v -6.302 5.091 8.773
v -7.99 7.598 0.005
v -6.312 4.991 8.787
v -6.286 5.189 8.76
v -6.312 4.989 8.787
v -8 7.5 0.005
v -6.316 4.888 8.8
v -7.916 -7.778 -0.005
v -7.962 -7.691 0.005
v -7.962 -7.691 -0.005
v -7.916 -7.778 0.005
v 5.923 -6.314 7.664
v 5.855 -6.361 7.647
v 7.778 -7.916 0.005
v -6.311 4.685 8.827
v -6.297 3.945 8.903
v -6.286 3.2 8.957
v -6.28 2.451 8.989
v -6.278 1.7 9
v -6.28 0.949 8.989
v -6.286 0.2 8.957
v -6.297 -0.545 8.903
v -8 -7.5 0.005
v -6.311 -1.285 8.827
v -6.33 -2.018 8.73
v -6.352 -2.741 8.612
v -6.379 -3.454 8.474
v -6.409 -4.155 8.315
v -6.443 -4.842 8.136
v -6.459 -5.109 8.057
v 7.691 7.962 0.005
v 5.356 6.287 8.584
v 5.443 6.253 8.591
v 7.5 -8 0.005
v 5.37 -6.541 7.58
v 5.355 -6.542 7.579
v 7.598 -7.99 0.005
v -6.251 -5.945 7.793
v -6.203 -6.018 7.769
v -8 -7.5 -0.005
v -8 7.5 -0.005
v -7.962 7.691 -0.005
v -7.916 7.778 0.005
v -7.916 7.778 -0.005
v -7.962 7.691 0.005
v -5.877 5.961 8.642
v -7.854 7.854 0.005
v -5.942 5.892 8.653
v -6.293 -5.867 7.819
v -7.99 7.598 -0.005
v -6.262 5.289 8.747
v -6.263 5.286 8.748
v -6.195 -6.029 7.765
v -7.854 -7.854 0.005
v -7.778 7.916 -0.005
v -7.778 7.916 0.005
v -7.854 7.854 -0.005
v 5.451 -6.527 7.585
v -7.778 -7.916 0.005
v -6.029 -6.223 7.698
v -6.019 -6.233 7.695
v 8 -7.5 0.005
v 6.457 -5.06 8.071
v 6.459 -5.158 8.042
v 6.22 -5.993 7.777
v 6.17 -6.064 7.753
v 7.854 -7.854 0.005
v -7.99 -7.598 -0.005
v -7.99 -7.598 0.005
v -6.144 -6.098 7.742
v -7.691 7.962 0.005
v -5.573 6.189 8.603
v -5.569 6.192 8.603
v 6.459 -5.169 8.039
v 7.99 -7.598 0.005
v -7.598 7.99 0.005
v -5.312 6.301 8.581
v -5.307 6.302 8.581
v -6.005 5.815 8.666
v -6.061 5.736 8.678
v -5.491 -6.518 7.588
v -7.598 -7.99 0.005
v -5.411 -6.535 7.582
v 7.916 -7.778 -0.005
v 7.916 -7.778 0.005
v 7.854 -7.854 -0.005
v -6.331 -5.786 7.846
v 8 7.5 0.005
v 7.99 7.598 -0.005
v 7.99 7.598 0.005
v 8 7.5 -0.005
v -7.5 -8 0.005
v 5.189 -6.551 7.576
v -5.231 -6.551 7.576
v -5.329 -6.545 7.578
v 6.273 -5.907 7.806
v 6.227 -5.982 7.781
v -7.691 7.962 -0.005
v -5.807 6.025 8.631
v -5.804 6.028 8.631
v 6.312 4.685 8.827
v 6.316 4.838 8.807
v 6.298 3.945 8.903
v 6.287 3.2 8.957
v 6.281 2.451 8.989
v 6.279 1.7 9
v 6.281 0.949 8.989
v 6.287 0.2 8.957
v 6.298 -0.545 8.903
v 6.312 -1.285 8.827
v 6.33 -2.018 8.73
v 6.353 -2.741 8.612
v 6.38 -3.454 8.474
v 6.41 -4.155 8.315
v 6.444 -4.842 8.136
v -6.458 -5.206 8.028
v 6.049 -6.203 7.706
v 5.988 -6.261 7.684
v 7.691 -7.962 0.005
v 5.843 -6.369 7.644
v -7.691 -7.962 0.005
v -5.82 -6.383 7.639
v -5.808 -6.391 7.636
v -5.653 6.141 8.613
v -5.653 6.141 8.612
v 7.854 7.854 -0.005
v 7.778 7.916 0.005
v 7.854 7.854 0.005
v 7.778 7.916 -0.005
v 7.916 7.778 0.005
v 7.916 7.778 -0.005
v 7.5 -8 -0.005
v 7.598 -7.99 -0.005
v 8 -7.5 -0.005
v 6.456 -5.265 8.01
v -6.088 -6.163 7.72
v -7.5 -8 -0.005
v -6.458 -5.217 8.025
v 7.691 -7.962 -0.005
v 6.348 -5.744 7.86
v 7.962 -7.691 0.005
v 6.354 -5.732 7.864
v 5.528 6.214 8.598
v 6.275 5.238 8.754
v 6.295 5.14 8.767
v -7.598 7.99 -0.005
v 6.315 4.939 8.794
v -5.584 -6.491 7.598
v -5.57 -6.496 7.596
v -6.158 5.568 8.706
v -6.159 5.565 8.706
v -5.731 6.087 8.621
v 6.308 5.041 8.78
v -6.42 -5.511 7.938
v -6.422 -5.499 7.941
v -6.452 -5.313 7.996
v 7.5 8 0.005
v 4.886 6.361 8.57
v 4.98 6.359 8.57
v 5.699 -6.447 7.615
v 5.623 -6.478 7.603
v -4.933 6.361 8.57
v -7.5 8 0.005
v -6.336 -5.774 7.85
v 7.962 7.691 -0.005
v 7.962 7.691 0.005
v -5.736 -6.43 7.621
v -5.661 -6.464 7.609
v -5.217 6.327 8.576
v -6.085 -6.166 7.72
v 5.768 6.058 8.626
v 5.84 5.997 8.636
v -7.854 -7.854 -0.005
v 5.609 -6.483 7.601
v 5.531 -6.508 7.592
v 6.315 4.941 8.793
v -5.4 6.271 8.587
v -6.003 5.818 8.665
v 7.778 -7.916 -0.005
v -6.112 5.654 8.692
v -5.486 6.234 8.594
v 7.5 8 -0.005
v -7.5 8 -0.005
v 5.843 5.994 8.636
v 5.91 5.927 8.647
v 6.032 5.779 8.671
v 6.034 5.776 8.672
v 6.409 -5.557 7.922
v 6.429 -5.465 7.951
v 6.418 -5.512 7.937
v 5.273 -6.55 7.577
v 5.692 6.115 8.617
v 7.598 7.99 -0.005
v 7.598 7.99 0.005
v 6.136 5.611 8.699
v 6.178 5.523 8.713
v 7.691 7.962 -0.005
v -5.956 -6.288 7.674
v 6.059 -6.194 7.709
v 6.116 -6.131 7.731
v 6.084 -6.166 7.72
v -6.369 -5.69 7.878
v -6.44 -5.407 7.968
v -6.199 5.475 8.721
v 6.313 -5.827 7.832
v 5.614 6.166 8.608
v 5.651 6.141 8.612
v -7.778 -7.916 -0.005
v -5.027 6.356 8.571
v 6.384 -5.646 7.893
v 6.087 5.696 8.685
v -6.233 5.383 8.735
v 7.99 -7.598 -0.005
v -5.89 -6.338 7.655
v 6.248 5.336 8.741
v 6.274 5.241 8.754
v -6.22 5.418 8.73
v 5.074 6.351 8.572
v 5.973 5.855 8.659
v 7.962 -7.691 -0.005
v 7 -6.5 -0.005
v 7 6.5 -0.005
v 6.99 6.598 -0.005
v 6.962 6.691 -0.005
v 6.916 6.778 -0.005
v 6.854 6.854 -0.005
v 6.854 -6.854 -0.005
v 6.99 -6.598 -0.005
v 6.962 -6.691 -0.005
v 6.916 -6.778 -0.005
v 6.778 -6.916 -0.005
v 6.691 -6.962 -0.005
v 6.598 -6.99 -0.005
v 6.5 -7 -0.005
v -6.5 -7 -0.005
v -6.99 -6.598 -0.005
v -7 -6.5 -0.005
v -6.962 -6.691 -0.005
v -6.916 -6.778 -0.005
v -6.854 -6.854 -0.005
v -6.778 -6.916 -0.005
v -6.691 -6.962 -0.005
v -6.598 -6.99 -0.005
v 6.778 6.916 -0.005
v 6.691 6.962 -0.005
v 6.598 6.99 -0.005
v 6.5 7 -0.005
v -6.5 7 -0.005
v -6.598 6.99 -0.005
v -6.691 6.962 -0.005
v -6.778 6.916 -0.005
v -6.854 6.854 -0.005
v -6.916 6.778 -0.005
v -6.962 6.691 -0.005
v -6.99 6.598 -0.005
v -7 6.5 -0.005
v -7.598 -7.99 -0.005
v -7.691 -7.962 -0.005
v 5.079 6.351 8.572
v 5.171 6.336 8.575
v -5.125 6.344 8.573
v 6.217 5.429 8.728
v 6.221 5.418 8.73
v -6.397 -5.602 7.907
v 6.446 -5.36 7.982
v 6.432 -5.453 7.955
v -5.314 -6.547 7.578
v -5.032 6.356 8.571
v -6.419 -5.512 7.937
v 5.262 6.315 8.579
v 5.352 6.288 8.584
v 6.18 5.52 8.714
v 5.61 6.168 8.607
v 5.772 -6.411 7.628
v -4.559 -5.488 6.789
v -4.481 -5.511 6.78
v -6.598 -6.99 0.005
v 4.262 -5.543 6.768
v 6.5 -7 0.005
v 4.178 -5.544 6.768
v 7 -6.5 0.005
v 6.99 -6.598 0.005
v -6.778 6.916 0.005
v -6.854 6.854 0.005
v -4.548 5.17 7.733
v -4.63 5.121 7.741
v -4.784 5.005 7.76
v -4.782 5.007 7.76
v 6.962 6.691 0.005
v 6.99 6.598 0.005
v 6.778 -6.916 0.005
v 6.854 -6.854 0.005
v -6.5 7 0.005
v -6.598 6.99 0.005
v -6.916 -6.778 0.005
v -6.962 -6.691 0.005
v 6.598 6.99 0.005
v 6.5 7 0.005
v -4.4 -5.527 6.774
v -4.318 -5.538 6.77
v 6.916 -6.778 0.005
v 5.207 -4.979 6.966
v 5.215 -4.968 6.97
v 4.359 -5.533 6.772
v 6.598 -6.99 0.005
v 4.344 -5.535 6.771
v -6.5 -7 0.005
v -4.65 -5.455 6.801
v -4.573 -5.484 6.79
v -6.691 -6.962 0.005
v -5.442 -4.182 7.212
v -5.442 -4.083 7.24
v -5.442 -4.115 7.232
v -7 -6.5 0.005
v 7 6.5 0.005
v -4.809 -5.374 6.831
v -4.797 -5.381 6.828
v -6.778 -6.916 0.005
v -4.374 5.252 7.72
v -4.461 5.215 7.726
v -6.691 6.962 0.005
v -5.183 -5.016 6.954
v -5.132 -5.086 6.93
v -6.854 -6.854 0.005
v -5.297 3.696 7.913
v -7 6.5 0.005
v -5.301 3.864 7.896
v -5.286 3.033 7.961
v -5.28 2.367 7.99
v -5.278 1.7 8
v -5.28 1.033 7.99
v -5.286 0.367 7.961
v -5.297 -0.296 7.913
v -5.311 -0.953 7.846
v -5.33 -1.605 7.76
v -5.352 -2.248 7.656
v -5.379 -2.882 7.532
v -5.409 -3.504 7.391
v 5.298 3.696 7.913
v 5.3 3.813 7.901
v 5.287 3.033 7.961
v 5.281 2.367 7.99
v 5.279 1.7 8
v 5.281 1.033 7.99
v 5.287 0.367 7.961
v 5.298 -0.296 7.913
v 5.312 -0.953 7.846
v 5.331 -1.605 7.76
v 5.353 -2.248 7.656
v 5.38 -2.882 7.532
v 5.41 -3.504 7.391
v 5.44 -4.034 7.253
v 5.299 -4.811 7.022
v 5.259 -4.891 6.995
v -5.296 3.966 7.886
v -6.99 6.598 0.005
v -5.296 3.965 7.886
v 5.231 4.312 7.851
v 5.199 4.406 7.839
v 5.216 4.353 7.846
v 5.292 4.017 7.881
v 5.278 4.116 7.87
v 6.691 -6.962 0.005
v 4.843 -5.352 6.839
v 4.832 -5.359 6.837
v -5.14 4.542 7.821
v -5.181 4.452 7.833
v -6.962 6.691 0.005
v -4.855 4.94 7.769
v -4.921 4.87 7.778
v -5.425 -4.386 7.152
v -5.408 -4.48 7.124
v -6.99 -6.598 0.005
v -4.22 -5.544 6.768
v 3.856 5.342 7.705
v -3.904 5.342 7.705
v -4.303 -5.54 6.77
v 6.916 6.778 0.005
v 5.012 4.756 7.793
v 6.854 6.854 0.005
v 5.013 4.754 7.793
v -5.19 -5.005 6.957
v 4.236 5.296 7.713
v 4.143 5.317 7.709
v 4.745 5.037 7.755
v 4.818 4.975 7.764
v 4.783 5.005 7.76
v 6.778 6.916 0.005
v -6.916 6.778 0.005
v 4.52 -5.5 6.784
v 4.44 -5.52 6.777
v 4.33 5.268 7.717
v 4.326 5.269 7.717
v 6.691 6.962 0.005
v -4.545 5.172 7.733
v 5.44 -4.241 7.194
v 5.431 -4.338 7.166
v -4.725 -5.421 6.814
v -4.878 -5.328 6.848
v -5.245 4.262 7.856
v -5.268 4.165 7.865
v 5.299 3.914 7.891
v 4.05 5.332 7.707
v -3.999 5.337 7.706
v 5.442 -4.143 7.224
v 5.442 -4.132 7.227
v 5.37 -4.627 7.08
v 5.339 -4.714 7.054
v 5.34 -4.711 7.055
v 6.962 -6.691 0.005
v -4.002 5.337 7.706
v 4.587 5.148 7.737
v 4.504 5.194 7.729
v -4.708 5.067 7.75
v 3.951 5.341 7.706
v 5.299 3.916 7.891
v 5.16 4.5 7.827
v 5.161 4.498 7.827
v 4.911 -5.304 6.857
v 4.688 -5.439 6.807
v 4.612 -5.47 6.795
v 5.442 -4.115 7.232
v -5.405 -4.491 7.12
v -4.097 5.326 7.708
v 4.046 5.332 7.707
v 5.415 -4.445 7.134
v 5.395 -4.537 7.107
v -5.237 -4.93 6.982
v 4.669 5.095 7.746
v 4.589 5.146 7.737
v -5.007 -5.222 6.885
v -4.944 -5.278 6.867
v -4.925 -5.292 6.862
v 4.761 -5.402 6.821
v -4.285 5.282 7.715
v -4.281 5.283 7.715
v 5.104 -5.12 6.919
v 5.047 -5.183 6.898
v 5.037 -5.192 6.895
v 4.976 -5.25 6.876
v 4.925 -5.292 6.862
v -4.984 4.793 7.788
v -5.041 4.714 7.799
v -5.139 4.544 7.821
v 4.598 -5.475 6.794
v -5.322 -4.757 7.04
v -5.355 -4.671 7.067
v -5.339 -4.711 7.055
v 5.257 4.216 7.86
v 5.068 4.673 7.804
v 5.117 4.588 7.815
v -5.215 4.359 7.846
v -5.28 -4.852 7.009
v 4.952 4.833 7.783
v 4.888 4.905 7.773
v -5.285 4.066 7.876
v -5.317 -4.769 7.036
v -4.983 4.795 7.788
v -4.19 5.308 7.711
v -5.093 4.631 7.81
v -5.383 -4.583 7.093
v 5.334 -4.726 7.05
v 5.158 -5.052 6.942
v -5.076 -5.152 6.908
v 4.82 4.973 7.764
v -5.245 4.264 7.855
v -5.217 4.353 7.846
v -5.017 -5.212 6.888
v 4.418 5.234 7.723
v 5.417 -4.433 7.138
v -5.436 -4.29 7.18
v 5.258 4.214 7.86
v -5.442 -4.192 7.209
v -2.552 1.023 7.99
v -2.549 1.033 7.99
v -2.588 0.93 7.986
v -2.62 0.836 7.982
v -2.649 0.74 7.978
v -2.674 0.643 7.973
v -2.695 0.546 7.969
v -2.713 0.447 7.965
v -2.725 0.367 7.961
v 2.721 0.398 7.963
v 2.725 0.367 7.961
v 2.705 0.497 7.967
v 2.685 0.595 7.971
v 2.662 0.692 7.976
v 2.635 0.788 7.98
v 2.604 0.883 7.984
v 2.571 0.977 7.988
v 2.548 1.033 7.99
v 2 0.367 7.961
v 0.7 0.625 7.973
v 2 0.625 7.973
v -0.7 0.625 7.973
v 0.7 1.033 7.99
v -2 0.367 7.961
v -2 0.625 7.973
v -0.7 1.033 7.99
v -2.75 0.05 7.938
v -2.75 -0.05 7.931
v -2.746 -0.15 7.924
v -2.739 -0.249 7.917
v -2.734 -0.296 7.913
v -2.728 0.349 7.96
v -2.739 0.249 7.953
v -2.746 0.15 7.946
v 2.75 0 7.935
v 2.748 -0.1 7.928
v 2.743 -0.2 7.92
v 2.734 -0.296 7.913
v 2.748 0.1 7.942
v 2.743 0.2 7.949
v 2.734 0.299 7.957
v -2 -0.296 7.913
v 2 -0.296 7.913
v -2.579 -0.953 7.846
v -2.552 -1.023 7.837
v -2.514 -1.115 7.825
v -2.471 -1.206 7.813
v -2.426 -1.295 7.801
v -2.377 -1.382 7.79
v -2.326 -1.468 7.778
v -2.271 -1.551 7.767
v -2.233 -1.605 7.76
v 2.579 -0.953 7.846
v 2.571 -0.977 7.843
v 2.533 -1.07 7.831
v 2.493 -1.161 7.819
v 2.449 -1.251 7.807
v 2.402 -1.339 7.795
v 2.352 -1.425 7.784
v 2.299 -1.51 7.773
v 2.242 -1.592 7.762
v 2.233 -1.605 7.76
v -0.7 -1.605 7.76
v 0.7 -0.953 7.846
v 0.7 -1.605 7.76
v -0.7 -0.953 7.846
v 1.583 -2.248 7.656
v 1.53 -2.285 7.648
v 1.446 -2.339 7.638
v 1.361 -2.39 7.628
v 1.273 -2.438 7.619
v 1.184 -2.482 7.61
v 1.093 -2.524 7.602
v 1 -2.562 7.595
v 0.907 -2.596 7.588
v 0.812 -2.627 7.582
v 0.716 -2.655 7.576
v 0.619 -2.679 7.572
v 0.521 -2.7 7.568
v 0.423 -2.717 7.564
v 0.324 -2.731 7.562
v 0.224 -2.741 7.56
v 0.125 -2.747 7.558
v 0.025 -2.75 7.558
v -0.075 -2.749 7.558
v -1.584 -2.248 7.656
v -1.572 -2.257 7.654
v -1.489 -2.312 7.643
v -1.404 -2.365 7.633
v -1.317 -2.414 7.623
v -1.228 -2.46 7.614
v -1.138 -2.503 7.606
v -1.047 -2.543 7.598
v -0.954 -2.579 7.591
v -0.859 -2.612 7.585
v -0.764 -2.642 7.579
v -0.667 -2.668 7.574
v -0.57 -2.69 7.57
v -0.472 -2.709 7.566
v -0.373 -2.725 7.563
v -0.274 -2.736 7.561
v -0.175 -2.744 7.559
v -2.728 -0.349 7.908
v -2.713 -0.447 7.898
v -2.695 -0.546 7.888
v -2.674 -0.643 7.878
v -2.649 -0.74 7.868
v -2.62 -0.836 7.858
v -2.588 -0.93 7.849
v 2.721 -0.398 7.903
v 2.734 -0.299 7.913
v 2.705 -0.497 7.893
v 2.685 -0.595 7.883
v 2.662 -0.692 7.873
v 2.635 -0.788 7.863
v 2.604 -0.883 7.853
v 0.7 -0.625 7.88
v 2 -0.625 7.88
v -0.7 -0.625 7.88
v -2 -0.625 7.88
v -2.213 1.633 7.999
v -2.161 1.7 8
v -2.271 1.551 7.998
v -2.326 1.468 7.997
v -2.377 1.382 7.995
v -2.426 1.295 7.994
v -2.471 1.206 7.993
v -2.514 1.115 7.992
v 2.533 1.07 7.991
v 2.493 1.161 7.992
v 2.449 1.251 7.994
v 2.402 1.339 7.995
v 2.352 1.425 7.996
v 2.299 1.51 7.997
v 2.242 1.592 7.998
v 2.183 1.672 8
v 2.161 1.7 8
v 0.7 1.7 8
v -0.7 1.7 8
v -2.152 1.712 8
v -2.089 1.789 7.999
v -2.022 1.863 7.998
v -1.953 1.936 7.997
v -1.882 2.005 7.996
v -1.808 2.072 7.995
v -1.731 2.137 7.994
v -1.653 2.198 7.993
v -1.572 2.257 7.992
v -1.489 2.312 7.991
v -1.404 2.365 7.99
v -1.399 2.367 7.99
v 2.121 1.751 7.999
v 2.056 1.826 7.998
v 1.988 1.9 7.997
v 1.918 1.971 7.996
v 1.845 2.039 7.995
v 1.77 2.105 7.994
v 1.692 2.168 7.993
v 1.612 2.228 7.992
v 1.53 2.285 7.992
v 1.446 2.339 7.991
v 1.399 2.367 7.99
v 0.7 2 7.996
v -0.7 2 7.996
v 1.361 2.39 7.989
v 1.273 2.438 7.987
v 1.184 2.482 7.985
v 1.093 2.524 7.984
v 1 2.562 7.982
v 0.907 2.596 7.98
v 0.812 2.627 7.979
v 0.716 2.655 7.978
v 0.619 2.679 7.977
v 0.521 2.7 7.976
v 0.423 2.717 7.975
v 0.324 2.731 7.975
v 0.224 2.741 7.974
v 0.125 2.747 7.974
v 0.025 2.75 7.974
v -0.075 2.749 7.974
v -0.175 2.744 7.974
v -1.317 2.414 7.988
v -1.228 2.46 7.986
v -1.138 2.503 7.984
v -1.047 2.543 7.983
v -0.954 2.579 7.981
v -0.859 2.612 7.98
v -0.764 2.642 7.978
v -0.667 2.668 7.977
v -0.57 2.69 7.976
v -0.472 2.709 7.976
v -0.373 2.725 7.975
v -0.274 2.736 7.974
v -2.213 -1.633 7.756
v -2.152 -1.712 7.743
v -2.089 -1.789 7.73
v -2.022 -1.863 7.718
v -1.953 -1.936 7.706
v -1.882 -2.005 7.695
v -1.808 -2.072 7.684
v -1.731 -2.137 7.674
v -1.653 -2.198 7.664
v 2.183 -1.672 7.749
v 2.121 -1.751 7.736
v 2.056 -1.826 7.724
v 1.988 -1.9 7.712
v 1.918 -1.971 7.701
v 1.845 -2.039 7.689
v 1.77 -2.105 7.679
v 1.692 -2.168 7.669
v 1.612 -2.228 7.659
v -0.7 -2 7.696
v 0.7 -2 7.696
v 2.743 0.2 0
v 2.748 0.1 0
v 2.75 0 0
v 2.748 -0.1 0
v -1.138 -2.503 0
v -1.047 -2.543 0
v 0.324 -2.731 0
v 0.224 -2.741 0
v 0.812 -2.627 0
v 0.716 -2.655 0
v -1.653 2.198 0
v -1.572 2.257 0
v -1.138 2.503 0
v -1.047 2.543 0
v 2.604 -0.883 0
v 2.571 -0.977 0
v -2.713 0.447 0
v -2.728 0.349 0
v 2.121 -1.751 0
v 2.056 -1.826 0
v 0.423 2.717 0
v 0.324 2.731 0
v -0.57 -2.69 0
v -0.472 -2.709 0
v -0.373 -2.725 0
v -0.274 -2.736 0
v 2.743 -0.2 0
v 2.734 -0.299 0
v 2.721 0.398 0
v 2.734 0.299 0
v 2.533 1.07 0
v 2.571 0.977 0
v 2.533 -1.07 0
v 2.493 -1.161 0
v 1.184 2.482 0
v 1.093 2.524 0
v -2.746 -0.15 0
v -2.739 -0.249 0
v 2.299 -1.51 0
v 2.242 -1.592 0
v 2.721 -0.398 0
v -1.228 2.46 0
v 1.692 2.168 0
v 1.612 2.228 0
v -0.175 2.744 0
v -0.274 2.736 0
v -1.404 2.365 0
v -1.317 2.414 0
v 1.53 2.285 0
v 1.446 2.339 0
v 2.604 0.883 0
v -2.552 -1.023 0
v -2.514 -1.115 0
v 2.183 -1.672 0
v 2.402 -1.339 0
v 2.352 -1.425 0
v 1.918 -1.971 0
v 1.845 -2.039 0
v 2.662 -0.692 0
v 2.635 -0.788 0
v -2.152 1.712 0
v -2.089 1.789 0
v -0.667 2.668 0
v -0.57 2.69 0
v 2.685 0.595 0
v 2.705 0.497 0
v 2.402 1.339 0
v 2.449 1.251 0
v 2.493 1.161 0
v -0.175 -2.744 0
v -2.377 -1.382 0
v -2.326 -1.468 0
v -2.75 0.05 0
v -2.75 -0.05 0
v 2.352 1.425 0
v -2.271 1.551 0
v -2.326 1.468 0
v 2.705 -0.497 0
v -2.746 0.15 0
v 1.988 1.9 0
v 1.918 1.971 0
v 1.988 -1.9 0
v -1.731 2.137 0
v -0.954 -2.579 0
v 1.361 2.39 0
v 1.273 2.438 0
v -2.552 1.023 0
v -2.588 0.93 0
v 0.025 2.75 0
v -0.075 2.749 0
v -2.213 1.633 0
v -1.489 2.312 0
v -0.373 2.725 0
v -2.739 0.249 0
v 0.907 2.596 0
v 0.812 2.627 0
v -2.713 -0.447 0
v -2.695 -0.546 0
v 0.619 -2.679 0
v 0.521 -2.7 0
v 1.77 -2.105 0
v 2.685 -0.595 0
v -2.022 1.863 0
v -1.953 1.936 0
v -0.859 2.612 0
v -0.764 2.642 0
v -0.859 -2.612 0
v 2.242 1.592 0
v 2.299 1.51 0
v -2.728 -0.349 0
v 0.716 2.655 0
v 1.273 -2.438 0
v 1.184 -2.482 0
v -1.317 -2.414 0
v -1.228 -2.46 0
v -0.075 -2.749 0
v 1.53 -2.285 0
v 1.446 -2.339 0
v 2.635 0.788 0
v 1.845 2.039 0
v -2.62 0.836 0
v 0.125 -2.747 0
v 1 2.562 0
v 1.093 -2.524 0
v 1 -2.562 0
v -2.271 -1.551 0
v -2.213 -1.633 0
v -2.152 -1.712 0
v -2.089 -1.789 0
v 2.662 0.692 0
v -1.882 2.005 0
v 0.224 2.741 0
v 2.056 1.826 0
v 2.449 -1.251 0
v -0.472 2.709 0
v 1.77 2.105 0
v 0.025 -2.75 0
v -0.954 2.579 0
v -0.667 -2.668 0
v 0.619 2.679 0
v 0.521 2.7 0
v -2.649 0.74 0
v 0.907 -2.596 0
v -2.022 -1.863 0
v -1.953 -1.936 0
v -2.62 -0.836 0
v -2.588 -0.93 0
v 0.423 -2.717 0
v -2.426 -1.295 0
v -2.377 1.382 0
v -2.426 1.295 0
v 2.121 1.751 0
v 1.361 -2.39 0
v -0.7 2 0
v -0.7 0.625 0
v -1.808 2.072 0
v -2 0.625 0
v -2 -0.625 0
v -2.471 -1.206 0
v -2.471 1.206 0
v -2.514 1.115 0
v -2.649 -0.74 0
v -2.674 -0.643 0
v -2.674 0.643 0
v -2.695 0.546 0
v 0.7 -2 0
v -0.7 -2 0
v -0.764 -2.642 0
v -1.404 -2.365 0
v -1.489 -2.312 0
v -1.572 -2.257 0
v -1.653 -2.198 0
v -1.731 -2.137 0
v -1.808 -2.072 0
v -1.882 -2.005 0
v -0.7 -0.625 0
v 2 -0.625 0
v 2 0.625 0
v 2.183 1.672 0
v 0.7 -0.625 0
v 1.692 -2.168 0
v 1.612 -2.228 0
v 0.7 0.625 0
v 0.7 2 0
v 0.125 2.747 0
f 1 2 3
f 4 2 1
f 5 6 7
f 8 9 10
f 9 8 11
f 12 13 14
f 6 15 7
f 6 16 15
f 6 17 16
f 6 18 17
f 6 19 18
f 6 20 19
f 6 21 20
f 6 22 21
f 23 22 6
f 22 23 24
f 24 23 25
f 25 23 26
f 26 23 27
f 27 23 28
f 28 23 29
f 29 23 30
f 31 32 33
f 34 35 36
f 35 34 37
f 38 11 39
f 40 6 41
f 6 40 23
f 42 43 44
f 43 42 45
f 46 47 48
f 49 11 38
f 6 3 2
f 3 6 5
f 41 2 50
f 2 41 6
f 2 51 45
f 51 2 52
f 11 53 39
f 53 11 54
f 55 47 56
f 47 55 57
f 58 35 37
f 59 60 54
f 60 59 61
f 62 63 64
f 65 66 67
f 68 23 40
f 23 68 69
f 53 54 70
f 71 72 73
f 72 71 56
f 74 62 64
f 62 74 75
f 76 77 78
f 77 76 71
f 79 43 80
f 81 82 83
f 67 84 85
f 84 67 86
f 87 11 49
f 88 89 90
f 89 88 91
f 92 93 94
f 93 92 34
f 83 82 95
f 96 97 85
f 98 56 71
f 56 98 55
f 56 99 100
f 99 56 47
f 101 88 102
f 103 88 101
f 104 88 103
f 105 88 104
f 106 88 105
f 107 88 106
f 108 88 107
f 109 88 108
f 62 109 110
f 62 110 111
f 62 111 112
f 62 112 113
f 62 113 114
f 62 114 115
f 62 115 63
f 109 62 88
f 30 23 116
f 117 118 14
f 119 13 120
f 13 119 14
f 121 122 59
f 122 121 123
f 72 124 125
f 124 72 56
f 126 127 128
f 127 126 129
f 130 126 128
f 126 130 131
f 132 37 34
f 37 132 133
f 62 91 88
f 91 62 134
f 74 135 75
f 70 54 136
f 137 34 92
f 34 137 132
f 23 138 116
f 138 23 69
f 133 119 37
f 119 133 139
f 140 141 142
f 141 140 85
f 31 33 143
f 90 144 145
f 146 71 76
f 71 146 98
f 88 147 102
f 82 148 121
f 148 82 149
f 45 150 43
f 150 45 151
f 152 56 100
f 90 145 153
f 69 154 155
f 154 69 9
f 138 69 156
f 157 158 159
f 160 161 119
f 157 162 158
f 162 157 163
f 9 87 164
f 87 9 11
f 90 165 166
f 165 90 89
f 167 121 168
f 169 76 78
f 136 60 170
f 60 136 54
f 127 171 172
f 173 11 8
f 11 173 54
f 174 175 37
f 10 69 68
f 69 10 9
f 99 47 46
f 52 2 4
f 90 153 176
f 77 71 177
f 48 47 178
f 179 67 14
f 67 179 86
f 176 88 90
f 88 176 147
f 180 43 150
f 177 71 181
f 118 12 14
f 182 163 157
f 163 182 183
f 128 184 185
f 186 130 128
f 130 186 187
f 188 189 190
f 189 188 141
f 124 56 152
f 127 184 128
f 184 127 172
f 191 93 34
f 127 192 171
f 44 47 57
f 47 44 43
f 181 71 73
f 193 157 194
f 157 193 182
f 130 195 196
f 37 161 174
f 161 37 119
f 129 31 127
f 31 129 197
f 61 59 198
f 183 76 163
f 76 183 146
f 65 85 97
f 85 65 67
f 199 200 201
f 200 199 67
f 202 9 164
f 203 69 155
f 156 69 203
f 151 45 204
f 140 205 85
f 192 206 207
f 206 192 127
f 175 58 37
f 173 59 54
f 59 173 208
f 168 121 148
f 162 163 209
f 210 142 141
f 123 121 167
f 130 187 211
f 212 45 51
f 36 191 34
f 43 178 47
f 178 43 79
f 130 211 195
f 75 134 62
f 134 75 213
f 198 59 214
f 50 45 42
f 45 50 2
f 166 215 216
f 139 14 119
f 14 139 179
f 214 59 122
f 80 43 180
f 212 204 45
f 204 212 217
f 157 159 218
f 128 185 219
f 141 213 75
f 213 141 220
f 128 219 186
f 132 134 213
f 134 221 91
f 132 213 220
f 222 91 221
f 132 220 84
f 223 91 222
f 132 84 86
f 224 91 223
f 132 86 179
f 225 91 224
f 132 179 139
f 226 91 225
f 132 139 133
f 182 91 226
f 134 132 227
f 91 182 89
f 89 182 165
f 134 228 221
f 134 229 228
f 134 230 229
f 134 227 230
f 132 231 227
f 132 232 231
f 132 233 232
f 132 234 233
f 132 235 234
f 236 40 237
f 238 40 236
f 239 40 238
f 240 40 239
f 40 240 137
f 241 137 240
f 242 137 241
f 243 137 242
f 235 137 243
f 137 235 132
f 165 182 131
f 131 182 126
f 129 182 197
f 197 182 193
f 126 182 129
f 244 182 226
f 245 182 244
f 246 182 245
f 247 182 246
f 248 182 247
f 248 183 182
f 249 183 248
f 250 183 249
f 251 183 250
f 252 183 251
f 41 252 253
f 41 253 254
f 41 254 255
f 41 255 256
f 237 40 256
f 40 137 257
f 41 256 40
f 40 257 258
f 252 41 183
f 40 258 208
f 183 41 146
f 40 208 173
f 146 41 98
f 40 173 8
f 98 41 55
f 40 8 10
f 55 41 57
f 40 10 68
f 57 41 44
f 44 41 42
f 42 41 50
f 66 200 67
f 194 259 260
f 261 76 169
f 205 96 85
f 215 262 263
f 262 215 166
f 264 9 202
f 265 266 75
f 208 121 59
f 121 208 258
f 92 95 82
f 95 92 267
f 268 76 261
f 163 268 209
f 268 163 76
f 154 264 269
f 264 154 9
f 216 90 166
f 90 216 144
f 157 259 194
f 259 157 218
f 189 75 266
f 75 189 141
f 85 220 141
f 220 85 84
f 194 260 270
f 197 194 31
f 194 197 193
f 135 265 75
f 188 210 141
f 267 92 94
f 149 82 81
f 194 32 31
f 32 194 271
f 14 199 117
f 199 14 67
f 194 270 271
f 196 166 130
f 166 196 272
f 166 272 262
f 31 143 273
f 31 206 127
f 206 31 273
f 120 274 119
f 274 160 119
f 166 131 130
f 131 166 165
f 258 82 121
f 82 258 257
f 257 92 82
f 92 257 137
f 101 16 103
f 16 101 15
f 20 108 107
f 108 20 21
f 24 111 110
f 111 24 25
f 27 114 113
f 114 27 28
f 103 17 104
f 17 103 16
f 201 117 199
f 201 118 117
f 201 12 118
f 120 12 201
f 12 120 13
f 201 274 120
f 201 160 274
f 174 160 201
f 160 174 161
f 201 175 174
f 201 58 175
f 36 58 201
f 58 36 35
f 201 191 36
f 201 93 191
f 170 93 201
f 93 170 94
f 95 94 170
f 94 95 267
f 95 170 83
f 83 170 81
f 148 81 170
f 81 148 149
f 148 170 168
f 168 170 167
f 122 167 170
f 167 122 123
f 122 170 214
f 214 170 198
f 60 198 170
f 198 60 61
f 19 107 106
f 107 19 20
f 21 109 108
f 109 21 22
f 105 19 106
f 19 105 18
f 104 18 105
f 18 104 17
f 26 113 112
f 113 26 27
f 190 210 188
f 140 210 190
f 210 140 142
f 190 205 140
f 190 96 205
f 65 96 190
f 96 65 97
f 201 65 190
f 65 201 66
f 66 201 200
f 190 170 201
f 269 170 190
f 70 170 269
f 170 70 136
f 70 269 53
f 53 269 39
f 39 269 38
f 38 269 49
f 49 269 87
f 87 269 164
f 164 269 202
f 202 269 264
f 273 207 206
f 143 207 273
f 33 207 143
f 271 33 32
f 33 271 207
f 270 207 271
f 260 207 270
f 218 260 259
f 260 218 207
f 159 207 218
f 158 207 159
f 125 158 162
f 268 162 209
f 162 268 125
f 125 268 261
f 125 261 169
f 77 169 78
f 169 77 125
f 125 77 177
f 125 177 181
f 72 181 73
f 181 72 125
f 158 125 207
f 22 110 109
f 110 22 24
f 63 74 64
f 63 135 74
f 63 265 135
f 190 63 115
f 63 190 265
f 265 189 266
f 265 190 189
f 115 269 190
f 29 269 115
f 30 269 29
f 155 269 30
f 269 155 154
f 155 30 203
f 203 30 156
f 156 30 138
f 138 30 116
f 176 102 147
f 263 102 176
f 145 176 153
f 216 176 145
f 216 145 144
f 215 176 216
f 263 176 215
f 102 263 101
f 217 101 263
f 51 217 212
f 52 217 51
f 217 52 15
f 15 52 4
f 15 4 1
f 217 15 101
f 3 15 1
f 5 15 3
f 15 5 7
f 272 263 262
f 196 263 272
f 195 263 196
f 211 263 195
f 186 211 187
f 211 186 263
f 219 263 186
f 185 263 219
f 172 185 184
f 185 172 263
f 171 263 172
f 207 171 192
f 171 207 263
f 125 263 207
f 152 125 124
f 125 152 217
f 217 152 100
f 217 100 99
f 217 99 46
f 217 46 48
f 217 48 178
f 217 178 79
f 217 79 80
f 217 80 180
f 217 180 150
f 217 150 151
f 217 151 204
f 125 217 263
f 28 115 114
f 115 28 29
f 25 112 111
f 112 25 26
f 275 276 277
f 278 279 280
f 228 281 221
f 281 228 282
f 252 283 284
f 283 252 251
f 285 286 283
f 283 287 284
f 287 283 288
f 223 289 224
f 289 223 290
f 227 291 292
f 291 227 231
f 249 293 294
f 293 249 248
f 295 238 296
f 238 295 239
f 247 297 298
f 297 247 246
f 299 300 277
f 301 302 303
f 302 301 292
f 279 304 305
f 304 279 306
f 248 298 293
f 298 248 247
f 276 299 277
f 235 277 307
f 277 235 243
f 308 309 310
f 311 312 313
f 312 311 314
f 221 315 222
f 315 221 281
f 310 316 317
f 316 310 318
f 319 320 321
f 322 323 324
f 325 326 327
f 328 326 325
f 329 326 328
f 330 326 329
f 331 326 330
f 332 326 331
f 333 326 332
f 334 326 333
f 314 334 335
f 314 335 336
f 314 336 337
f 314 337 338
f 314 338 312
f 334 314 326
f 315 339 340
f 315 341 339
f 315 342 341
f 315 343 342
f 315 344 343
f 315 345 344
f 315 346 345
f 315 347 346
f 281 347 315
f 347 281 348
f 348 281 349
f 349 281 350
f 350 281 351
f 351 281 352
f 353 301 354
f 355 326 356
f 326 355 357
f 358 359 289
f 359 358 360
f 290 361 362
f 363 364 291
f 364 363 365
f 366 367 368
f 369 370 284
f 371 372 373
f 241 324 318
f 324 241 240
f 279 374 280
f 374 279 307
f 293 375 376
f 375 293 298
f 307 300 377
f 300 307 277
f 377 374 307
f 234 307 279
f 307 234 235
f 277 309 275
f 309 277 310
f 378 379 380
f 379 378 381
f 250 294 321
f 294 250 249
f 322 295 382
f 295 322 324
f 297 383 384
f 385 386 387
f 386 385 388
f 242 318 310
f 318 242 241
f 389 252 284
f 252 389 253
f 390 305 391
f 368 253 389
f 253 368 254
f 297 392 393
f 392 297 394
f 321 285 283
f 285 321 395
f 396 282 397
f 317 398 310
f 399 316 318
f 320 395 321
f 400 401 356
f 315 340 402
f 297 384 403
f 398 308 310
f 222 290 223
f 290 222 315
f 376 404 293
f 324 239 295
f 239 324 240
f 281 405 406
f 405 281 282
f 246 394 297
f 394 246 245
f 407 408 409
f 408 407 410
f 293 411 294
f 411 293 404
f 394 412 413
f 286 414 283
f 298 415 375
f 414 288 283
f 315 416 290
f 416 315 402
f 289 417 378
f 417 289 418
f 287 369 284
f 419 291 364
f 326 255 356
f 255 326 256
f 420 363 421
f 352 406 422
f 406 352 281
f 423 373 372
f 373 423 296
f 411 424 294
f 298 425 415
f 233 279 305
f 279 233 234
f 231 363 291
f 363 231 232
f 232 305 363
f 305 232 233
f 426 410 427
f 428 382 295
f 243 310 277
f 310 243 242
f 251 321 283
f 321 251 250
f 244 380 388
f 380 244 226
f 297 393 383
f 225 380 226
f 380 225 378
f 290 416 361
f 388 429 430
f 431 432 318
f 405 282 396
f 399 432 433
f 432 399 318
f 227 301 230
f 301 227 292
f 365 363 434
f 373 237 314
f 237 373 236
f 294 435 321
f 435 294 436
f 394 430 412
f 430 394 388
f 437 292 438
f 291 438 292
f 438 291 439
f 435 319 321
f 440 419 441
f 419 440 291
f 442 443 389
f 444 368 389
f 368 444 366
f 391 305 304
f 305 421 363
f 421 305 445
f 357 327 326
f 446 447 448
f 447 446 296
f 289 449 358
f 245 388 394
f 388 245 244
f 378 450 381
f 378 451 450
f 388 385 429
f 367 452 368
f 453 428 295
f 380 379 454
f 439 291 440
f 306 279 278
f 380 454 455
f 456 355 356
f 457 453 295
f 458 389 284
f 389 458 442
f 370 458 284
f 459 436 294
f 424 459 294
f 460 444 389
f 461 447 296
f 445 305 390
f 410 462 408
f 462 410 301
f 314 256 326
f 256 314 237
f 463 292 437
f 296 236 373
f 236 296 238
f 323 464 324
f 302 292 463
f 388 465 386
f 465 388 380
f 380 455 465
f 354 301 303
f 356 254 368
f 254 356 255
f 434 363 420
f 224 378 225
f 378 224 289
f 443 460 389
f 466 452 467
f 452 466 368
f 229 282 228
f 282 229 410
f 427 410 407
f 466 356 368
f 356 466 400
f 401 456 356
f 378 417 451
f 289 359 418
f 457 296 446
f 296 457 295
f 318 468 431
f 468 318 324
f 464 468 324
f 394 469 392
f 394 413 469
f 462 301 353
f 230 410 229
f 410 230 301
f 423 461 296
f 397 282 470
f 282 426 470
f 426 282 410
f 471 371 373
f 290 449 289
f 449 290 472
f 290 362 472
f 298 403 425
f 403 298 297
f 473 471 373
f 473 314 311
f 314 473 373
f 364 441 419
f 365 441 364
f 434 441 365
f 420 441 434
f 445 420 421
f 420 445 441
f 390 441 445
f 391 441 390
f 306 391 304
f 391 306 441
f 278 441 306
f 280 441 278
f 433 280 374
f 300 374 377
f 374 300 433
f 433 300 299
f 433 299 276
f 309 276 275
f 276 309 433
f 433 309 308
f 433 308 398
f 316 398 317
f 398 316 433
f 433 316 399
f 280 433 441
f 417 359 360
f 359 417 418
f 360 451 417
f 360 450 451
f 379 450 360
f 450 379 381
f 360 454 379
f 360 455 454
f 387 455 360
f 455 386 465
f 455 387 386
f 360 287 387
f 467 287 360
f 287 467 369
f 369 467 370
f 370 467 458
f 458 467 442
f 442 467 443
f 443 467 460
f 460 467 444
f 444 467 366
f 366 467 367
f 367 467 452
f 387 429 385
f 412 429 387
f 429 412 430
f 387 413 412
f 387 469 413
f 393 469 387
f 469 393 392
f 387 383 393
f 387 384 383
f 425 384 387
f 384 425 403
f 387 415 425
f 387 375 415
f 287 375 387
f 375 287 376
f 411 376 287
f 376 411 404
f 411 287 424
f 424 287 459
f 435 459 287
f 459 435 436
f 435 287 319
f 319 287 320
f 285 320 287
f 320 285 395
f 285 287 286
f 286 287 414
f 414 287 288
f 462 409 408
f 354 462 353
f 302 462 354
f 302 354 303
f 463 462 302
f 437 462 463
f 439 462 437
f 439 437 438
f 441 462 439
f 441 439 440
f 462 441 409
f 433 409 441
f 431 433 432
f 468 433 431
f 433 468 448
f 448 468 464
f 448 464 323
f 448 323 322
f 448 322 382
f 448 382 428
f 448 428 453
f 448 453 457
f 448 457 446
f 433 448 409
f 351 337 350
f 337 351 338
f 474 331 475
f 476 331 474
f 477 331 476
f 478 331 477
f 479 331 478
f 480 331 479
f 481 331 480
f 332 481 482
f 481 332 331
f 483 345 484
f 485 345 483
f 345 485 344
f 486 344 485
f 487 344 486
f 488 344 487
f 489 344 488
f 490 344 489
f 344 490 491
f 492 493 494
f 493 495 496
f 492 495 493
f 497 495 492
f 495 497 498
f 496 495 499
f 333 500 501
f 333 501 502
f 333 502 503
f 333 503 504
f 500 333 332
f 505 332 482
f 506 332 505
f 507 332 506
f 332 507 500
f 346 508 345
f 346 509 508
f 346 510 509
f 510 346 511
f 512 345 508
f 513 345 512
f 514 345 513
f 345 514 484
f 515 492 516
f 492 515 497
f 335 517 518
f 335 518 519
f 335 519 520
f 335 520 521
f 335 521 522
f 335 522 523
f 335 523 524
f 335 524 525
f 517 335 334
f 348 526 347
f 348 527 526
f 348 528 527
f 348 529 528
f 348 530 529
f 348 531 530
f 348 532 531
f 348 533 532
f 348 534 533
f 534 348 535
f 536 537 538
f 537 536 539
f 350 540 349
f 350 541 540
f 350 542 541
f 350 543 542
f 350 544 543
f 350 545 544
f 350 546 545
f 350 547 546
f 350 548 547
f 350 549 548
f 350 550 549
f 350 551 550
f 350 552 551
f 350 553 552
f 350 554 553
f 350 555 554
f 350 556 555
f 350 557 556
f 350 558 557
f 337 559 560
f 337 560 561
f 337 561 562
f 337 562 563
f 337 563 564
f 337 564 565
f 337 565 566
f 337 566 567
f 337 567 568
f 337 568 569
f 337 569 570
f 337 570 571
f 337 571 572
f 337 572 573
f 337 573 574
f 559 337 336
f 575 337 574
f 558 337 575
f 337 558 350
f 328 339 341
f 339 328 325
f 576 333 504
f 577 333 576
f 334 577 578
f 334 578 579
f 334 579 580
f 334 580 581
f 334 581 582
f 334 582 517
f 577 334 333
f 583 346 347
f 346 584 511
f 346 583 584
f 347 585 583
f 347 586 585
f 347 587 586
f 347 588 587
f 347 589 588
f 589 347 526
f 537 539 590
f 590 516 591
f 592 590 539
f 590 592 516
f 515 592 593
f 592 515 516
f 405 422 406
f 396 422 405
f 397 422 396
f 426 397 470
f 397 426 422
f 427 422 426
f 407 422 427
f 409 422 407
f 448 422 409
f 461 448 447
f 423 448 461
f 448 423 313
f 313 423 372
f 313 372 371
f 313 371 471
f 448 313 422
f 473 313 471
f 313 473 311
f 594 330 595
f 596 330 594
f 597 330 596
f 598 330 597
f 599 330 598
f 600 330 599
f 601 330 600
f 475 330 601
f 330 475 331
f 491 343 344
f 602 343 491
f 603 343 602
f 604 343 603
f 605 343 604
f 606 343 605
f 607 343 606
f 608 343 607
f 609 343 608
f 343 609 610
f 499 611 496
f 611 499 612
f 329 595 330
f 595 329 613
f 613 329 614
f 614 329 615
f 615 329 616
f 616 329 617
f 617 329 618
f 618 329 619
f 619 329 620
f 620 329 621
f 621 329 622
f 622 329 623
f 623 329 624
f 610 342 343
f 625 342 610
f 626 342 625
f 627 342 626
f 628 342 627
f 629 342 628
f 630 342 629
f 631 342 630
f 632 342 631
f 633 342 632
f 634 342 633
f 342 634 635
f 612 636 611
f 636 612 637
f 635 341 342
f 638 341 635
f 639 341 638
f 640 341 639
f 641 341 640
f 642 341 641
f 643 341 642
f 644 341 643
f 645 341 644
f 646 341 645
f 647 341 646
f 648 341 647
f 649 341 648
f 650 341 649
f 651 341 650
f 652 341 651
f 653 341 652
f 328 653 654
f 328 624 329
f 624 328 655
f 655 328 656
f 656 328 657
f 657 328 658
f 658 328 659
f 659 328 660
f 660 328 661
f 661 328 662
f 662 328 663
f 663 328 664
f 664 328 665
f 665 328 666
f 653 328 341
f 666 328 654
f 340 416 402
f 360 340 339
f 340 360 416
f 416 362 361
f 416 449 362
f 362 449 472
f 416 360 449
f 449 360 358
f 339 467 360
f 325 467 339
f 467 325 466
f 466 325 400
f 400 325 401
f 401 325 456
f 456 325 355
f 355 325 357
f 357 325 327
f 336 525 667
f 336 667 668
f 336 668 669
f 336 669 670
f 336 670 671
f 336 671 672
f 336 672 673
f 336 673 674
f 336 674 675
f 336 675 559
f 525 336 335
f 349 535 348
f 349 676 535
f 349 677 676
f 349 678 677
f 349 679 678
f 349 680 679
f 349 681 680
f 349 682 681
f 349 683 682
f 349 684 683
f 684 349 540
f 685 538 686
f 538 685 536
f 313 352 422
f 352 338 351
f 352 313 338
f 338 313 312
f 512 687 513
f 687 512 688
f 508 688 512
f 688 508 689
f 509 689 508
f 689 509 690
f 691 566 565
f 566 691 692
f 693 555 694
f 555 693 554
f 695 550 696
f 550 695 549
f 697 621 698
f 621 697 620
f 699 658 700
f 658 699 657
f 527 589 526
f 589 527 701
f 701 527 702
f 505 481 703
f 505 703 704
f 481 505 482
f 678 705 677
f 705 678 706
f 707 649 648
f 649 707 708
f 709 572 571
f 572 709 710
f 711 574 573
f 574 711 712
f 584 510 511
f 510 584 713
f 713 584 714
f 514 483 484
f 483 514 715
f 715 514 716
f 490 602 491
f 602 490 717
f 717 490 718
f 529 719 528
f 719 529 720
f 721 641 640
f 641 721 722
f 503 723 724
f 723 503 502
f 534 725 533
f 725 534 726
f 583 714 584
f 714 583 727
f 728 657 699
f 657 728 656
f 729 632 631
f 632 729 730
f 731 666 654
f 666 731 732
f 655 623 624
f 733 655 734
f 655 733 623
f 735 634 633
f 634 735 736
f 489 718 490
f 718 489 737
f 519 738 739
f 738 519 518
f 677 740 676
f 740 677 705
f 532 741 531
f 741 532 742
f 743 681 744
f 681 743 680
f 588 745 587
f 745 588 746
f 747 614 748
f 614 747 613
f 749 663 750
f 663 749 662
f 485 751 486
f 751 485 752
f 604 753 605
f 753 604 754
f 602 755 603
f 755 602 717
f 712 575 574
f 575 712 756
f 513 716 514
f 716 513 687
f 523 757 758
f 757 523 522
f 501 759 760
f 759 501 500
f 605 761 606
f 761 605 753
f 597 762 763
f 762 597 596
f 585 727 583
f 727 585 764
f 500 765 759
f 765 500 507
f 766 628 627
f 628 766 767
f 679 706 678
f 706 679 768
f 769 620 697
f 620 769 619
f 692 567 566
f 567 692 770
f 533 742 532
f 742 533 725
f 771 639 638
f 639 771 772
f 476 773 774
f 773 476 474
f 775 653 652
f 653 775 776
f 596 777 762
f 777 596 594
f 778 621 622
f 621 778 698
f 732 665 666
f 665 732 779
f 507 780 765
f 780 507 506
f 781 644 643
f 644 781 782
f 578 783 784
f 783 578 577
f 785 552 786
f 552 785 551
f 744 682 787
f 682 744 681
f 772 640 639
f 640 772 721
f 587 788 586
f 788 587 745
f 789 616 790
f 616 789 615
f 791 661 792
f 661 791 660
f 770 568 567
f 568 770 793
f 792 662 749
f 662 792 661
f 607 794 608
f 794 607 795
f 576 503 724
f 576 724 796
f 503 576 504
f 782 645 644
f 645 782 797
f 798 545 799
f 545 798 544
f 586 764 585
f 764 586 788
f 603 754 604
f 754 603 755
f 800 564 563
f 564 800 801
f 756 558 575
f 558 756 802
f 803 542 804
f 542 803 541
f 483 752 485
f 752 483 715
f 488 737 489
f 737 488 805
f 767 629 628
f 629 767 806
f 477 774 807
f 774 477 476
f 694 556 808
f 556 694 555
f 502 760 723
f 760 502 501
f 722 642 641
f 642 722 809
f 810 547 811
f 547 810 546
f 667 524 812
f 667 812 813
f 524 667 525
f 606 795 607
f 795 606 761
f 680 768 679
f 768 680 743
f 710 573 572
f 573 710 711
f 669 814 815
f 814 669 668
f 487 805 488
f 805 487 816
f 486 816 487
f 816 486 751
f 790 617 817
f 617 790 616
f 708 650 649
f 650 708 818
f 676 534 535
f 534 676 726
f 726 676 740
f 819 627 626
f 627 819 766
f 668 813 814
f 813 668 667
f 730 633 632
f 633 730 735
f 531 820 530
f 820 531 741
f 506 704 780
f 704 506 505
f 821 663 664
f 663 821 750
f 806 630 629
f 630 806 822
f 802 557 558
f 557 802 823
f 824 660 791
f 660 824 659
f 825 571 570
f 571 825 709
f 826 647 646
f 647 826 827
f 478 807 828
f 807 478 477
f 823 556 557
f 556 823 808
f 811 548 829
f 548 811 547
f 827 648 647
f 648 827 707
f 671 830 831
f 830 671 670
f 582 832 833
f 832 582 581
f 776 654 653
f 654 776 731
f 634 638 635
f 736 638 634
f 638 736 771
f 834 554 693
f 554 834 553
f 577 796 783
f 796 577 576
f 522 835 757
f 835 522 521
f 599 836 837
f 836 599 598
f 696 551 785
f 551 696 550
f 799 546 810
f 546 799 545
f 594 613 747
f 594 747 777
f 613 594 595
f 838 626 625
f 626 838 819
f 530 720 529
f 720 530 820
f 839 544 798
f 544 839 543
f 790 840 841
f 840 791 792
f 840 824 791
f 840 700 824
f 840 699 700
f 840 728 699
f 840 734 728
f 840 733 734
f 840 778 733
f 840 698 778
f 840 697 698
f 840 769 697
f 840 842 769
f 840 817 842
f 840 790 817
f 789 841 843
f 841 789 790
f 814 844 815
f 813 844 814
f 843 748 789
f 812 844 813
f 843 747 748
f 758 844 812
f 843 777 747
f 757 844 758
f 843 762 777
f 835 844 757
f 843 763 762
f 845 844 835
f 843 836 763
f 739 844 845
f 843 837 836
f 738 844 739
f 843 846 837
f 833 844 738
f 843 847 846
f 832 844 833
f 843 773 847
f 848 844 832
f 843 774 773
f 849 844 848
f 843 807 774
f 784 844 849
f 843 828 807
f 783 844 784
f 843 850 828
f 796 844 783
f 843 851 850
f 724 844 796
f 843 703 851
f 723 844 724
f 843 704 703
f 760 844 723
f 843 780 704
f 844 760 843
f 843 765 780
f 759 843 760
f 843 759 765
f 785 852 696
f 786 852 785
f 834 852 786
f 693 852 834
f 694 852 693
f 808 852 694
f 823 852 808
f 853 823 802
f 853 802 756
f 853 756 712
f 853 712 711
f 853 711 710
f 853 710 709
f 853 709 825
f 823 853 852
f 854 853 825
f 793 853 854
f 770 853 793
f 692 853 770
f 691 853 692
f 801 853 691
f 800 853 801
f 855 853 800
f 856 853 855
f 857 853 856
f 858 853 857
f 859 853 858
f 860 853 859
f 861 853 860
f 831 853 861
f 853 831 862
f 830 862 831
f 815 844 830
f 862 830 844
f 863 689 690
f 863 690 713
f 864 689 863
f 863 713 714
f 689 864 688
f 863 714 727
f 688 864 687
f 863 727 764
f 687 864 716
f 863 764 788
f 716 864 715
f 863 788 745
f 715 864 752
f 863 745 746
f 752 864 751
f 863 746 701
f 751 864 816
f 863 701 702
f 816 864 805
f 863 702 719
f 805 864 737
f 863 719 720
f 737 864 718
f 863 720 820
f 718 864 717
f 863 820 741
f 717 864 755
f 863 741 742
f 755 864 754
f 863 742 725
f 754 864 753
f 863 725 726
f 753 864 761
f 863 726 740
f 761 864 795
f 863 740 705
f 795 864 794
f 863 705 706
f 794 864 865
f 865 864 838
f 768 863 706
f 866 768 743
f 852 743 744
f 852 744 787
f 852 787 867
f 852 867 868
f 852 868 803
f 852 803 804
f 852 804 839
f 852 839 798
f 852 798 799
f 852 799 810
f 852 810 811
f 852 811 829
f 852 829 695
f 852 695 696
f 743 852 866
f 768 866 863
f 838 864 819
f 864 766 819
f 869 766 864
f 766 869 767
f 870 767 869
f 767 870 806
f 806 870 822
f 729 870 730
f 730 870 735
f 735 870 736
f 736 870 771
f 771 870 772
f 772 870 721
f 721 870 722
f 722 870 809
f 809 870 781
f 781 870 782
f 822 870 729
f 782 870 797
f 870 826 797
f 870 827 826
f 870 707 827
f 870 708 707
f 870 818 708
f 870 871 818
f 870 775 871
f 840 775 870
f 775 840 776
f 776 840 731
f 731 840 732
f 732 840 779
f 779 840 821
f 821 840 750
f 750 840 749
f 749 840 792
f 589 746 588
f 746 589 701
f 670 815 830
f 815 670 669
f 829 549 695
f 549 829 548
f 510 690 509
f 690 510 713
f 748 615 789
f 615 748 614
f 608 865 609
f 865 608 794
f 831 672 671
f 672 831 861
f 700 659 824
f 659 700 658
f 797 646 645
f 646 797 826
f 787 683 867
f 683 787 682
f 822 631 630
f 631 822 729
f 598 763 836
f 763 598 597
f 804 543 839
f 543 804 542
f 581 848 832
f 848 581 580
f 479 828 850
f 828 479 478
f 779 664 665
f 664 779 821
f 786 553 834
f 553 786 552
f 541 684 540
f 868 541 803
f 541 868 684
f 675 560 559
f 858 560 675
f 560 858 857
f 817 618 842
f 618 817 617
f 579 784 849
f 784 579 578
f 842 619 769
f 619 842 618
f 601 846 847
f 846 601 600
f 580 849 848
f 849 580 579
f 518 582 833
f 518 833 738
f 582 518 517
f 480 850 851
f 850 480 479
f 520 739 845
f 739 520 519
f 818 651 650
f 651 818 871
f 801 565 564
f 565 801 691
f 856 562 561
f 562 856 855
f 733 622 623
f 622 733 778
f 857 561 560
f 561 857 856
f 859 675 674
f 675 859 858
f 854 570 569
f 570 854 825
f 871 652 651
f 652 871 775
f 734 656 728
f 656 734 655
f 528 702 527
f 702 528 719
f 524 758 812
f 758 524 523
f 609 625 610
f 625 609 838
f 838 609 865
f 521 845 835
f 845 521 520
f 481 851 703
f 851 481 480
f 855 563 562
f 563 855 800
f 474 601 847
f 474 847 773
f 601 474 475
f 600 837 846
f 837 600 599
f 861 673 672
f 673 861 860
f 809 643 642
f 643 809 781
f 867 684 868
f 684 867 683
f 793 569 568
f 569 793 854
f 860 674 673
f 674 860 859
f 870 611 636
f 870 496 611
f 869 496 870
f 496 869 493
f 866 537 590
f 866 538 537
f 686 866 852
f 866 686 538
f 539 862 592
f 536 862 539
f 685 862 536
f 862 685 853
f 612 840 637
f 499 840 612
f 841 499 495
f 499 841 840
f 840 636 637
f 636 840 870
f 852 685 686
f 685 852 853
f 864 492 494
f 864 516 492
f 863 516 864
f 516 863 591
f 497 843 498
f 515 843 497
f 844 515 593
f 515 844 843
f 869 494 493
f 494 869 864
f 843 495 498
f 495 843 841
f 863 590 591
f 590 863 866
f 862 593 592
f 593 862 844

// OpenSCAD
// file: stem.scad
$fs = 0.1;

// --------
// ステム
// --------
stem_outer_size = 5.5;
stem_cross_length = 4.0;
stem_cross_h = 1.25 + 0.15;
stem_cross_v = 1.10 + 0.15;

module stem() {
  difference () {
    cylinder(d = stem_outer_size, h=15);
    // 十字部分
    translate([0, 0, 15 / 2])
      cube([stem_cross_h, stem_cross_length, 15], center = true);
    translate([0, 0, 15 / 2])
      cube([stem_cross_length, stem_cross_v, 15], center = true);
  }
}
// file: keycap_convex.scad
include <keycap_base.scad>
use <stem.scad>

// コンベックスキー
convex_key_height = base_height + 2;
convex_key_top = key_top * ((convex_key_height * (key_top / key_bottom)) / base_height);

module convex_outershape(key_bottom_size, key_top_size, key_top_height) {
  intersection(){
    // コンベックスの円柱と重なるように、四角を長めに作成しておく
    base_cube(key_bottom_size, key_top_size, key_top_height, angle=0, shift_upword =0);
    rotate([0,90,0]) {
        $fn=128;
        // この丸みを小さくすると、丸くなる
        convex_value = 1.7;
        scale([1,convex_value,1])
          translate([0, 1, 0])
          cylinder(key_bottom_size,key_top_height,key_top_height,true);
    }
  }
}

module convex_innershape(bottom, top, height) {
  thickness = 1;
  convex_outershape(bottom - (thickness * 2), top - (thickness * 2), height - thickness);
  /* base_cube(bottom - (thickness * 2), top - (thickness * 2), height - thickness, angle=0, shift_upword=0); */
}

module convex_shape(bottom, top, height) {
  difference () {
    convex_outershape(bottom, top, height);
    convex_innershape(bottom, top, height);
  }
}

// コンベックスキー
module keycap_convex() {
  convex_shape(key_bottom, convex_key_top, convex_key_height);

  // キーキャップと合わせられるステムを作成
  intersection() {
    stem();
    // キートップの厚さは1.5mmとする
    convex_outershape(key_bottom, convex_key_top, convex_key_height);
  }
}
// file: keycap_base.scad
$fs = 0.1;
$fa = 0.25;  // くり抜く円柱を作成のため、精度を上げる

use <stem.scad>

key_bottom = 16;
key_top = 12.5;

// 基準の高さ
base_height = 7;

// --------
// キャップ部分
// --------

// 角が丸い四角
module rounded_cube(size, r) {
  // cylinder の高さ (適当な値)
  h = 0.0001;
  minkowski() {
    cube([size[0] - r*2, size[1] - r*2, size[2] - h], center = true);
    cylinder(r = r, h = h);
  }
}

// くり抜くための円を作成する
function dish_r(w, d) = (w * w + 4 * d) / (8 * d);

// 四角
module keycap_outer_shape(key_bottom_size, key_top_size, key_top_height, angle, dish_depth, shift_upword) {
  difference() {
    // 基本的なキーキャップを作成
    base_cube(key_bottom_size, key_top_size, key_top_height, angle, shift_upword);

    // くり抜く円柱を作成
    translate([0, 0, key_top_height])
      rotate([- angle, 0, 0])
      translate([0, 0, dish_r(key_top_size, dish_depth) - dish_depth])
        rotate([90, 0, 0])
        cylinder(r = dish_r(key_top_size, dish_depth), h = 60, center = true);
  }
}

// 基本的なキーキャップを作成
module base_cube(key_bottom_size, key_top_size, key_top_height, angle, shift_upword) {
  hull() {
    // cherry プロファイルっぽく上にずらす
    translate([0, shift_upword, key_top_height])
      rotate([- angle,  0, 0])
        rounded_cube([key_top_size, key_top_size, 0.01], 1.5);
    rounded_cube([key_bottom_size, key_bottom_size, 0.01], 0.5);
  }
}

// キーキャップのくり抜くための四角
module keycap_inner_shape(bottom, top, height, angle, depth, shift_upword) {
    thickness = 1;
    keycap_outer_shape(bottom - (thickness * 2), top - (thickness * 2), height - thickness, angle, depth, shift_upword);
}

// スイッチ部分をくり抜いてキーキャップを作成
module keycap_shape(bottom, top, height, angle, shift_upword) {
  depth = 0.8;
  difference () {
    keycap_outer_shape(bottom, top, height, angle, depth, shift_upword);
    keycap_inner_shape(bottom, top, height, angle, depth, shift_upword);
  }
}

module keycap(key_height, key_angle, shift_upword = 0) {

  keycap_shape(key_bottom, key_top, key_height, key_angle, shift_upword);

  // キーキャップと合わせられるステムを作成
  intersection() {
    stem();
    // キートップの厚さは1.5mmとする
    keycap_outer_shape(key_bottom, key_top, key_height, key_angle, 1.5, shift_upword);
  }
}
// main file
include <keycap_base.scad>
include <keycap_convex.scad>

r3_height = base_height - 0.6;

// R2
module keycap_r2() {
  // D 0.736mm
  shift_upward = 1;
  keycap(base_height, 2, shift_upward);
}

// R3
module keycap_r3() {
  // C 0.704mm
  shift_upward = 1;
  keycap(r3_height, 4, shift_upward);
}

// ホームポジション用の棒線を配置する
module keycap_home() {
  union() {
    keycap_r3();
    hull(){
      translate([-3,-3.5,r3_height - 0.5]) sphere(0.5);
      translate([3,-3.5,r3_height - 0.5]) sphere(0.5);
    }
  }
}

// R4
module keycap_r4() {
  // C 0.74mm
  shift_upward = 1;
  keycap(base_height - 0.3, 10, shift_upward);
}

// コンベックス
module convex() {
  keycap_convex();
}

/* keycap_r2(); */
/* keycap_r3(); */
/* keycap_r4(); */
convex();
/* keycap_home(); */


//for (x = [0, 1, 2, 3, 4])
  //translate([17 * x, 17, 0])
    //keycap_r4();

/* for (x = [0, 1, 2, 3, 4])        */
/*   translate([17 * x, 17 * 2, 0]) */
/*     keycap_r3();                 */

/* for (x = [0, 1, 2, 3, 4])        */
/*   translate([17 * x, 17 * 3, 0]) */
/*     keycap_r2();                 */
